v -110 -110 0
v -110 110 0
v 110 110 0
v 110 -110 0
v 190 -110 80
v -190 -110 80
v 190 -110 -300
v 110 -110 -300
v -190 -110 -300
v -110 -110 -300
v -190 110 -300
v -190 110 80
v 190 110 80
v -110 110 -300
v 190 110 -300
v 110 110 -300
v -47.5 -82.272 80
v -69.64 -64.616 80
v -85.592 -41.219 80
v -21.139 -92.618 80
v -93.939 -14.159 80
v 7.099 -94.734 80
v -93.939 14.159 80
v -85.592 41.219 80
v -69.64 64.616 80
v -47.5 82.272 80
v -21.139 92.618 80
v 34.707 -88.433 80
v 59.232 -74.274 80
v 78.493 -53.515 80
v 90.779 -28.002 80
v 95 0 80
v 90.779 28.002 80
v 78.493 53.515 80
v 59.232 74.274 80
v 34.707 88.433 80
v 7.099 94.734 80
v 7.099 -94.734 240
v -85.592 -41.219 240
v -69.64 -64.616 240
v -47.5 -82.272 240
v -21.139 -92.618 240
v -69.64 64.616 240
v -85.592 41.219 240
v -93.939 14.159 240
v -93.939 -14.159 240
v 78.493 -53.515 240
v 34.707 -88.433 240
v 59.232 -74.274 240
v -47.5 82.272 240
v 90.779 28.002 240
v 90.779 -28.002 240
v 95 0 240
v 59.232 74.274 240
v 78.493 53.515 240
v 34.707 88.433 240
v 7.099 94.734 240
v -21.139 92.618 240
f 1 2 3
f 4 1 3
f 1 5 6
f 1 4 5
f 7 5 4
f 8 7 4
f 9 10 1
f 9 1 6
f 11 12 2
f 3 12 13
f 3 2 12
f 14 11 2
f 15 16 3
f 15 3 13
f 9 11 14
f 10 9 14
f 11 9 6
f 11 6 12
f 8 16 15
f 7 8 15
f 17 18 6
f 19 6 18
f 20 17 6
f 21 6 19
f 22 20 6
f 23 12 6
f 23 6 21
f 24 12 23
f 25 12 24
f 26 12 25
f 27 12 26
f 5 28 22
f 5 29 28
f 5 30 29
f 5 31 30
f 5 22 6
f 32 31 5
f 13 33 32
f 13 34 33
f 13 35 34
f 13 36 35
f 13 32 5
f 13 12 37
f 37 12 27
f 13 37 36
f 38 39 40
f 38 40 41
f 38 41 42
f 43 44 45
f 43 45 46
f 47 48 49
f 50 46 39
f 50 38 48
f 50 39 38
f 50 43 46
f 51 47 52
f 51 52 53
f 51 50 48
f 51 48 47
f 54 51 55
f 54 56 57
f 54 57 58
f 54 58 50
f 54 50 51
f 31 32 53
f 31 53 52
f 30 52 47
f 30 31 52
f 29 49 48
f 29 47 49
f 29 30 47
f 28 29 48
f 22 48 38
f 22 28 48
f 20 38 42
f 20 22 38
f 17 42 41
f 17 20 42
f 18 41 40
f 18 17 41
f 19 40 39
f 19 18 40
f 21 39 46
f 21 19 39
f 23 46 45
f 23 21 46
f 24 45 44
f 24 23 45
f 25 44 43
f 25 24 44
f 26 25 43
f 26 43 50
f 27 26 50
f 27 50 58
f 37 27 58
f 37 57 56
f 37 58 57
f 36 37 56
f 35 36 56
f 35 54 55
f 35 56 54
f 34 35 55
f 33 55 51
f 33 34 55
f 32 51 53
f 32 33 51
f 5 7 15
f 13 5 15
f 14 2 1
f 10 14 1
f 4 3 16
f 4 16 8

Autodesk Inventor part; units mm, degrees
ref_plane "YZ Plane" through (0, 0, 0) normal (1, 0, 0) x (0, 1, 0)
ref_plane "XZ Plane" through (0, 0, 0) normal (0, 1, 0) x (-1, 0, 0)
ref_plane "XY Plane" through (0, 0, 0) normal (0, 0, 1) x (1, 0, 0)
sketch "Sketch2" plane through (0, 0, 0) normal (0, 0, 1) x (1, 0, 0)
  line L0 (-190, 110) -> (-110, 110)
  line L1 (-110, 110) -> (-110, -110)
  line L2 (-110, -110) -> (-190, -110)
  line L3 (-190, -110) -> (-190, 110)
  line L4 (-190, 110) -> (-110, -110) construction
  line L5 (-110, 110) -> (-190, -110) construction
  line L6 (0, 0) -> (0, 15) construction
  line L7 (190, 110) -> (110, 110)
  line L8 (110, 110) -> (110, -110)
  line L9 (110, -110) -> (190, -110)
  line L10 (190, -110) -> (190, 110)
  line L11 (190, 110) -> (110, -110) construction
  line L12 (110, 110) -> (190, -110) construction
  point P0 (-150, 0)
  point P1 (-150, 0)
  point P2 (150, 0)
  point P3 (150, 0)
  dimension "d0" = 80
  dimension "d1" = 220
  dimension "d2" = 150
  dimension "d3" = 15
extrude "Extrusion1" add sketch "Sketch2" against normal blind 300
sketch "Sketch3" plane through (0, 0, 0) normal (0, 0, 1) x (1, 0, 0)
  line L0 (-190, 110) -> (-110, 110) projected
  line L1 (190, -110) -> (190, 110) projected
  line L2 (-190, 110) -> (190, 110)
  line L3 (190, 110) -> (190, -110)
  line L4 (190, -110) -> (-190, -110)
  line L5 (-190, -110) -> (-190, 110)
  point P0 (0, 0)
extrude "Extrusion2" add sketch "Sketch3" along normal blind 80
sketch "Sketch4" plane through (0, 0, 80) normal (0, 0, 1) x (1, 0, 0)
  circle A0 centre (0, 0) radius 95
  dimension "d8" = 190
extrude "Extrusion3" add sketch "Sketch4" along normal blind 160
thread "Thread1" size "M190x8" class "6g" standard "ANSI Metric M Profile" full length
properties part number "09_Gripper"
